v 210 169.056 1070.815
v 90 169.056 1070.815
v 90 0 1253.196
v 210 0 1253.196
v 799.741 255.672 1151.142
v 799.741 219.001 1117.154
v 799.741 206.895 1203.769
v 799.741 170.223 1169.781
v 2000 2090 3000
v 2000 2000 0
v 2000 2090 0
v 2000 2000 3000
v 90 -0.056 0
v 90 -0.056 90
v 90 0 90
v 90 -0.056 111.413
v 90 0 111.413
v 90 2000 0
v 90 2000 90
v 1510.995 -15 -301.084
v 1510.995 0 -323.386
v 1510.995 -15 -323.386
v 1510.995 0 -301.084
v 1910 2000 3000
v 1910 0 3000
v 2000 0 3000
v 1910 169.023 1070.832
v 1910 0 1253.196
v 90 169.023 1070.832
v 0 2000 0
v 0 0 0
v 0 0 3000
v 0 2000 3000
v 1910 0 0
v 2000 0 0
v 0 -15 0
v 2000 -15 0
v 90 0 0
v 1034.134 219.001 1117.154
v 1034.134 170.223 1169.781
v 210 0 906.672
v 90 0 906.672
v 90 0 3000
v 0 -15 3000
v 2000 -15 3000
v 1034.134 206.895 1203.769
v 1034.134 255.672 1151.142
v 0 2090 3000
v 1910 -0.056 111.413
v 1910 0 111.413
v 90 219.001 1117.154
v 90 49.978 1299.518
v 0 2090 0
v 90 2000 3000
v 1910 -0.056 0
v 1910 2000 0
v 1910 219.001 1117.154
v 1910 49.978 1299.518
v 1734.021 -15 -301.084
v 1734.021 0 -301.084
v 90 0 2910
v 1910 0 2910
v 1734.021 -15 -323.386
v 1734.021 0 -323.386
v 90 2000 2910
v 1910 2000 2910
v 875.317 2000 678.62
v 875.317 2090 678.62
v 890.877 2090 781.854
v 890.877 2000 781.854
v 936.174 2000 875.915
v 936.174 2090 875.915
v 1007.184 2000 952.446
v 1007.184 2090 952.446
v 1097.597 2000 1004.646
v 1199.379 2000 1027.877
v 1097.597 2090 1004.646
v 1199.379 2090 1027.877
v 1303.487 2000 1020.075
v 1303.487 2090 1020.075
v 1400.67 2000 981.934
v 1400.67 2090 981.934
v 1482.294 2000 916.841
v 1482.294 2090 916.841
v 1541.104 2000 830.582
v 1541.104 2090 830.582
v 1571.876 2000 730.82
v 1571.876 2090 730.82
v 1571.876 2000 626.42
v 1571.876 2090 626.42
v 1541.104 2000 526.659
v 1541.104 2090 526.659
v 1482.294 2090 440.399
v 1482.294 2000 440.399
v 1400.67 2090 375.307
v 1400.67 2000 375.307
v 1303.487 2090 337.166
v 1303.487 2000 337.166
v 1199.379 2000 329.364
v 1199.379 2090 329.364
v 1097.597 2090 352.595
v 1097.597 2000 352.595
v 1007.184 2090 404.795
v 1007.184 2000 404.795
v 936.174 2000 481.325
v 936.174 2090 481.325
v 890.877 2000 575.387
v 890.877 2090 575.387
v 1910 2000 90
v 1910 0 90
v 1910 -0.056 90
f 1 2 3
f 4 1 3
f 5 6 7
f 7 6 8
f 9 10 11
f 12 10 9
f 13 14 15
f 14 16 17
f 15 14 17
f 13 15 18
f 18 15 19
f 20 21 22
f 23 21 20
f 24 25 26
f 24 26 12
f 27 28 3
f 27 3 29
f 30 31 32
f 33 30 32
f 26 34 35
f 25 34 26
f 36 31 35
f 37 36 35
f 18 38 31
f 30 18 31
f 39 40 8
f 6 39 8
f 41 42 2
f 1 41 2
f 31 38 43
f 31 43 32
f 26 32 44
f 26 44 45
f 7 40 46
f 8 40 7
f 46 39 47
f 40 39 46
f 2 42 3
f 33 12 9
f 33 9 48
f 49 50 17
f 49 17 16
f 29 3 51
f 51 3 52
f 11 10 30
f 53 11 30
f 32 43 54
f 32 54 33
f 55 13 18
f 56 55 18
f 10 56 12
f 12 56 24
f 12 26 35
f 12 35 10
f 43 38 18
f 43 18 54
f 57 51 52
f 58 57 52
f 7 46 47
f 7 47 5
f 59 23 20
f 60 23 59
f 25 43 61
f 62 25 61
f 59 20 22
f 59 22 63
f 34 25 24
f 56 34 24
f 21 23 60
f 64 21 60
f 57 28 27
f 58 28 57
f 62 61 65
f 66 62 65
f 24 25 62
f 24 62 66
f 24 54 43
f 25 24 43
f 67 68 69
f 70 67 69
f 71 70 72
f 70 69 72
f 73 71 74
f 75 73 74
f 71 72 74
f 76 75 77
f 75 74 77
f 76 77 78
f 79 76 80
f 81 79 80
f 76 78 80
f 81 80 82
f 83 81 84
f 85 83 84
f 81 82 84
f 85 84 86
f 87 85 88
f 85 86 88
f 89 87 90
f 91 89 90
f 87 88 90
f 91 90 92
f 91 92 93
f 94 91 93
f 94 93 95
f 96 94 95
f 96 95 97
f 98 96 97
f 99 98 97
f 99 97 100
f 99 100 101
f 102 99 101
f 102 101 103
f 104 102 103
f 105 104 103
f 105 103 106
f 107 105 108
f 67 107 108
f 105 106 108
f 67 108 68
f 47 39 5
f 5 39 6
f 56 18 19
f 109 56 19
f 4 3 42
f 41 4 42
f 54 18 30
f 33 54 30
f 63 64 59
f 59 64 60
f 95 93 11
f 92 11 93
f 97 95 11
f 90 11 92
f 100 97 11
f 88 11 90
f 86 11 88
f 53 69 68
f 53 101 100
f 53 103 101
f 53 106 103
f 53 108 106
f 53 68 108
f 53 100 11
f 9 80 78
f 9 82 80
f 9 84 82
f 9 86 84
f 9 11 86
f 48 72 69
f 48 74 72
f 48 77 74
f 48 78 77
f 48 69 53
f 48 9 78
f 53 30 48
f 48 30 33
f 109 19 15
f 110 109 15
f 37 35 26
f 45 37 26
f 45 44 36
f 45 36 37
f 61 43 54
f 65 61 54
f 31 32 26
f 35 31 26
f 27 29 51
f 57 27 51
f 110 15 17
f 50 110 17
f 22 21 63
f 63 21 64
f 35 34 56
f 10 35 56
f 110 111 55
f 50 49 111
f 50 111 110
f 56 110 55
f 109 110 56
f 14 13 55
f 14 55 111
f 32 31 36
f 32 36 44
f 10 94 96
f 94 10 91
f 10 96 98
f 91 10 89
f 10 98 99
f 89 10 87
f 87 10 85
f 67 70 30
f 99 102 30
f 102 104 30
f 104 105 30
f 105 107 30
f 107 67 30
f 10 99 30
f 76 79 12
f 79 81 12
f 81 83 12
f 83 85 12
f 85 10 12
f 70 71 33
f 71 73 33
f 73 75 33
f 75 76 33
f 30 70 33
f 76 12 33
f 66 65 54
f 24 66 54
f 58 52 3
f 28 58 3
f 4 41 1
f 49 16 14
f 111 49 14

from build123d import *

# Parameters (mm, degrees)
F0_W      = 2000
F0_H      = 3000
F1_DEPTH  = 15
F0_W_2    = 223.0252540781
F0_H_2    = 22.3025142319
F2_W      = 90
F2_H      = 3000
F3_DEPTH  = 2000
F5_DEPTH  = 120
F7_DEPTH  = 1820
F8_W      = 234.393119812
F8_H      = 71.7555948407
F9_DEPTH  = 50
F11_DEPTH = 1820
F12_W     = 2000
F12_H     = 90
F12_W_2   = 0.0563644571
F13_DEPTH = 1820
F14_W     = 2000
F14_H     = 3000
F15_DEPTH = 90
F16_W     = 2000
F16_H     = 3000
F17_DEPTH = 90
F18_R     = 350.2358859711
F19_DEPTH = 90


# Not quite as in the source:
# - ends of sketch curves that miss each other by under 0.0002 mm in the source are joined


with BuildPart() as f1:
    # F0 (on Front) → F1 (new body)
    with BuildSketch(Plane.XZ):
        with Locations((1000, 1500)):
            Rectangle(F0_W, F0_H)
    extrude(amount=F1_DEPTH)


with BuildPart() as f1b:
    # F0 (on Front) → F1, piece 2 (new body)
    with BuildSketch(Plane.XZ):
        with Locations((1622.508082666, -312.2352271864)):
            Rectangle(F0_W_2, F0_H_2)
    extrude(amount=F1_DEPTH)


with BuildPart() as f3:
    # F2 (on face) → F3 (new body)
    with BuildSketch(Plane(origin=(0, 0, 0), x_dir=(-1, 0, 0), z_dir=(0, 1, 0))):
        with Locations((-45, 1500)):
            Rectangle(F2_W, F2_H)
    extrude(amount=F3_DEPTH)


with BuildPart() as f5:
    # F4 (on face) → F5 (new body)
    with BuildSketch(Plane.YZ.offset(90)):
        Polygon((169.0563857555, 1070.8147287369), (0, 1253.195643425), (0, 906.6718220711), align=None)
    extrude(amount=F5_DEPTH)


with BuildPart() as f7:
    # F6 (on face) → F7 (new body)
    with BuildSketch(Plane.YZ.offset(90)):
        Polygon((0, 1253.1963586807), (169.0228581429, 1070.8320140839), (219.0007353757, 1117.1535890194), (49.9778772329, 1299.5179336163), align=None)
    extrude(amount=F7_DEPTH)


with BuildPart() as f9:
    # F8 (on face) → F9 (new body)
    with BuildSketch(Plane(origin=(0, 674.7720834381, 625.4068271396), x_dir=(-1, 0, 0), z_dir=(0, 0.733425793, 0.6797695243))):
        with Locations((-916.9374704361, 706.3570286676)):
            Rectangle(F8_W, F8_H)
    extrude(amount=F9_DEPTH)


with BuildPart() as f11:
    # F10 (on face) → F11 (new body)
    with BuildSketch(Plane.YZ.offset(90)):
        Polygon((2000, 2910), (2000, 3000), (0, 3000), (0, 2910), (434.6059262753, 2910), (667.1281456947, 2910), align=None)
    extrude(amount=F11_DEPTH)


with BuildPart() as f13:
    # F12 (on face) → F13 (new body)
    with BuildSketch(Plane.YZ.offset(90)):
        with Locations((1000, 45)):
            Rectangle(F12_W, F12_H)
        with Locations((-0.0281822286, 45)):
            Rectangle(F12_W_2, F12_H)
        Polygon((-0.0563644571, 90), (0, 90), (0, 111.4134863019), (-0.0564195216, 111.4134863019), align=None)
    extrude(amount=F13_DEPTH)


with BuildPart() as f15:
    # F14 (on face) → F15 (new body)
    with BuildSketch(Plane.YZ.offset(1910)):
        with Locations((1000, 1500)):
            Rectangle(F14_W, F14_H)
    extrude(amount=F15_DEPTH)


with BuildPart() as f17:
    # F16 (on face) → F17 (new body)
    with BuildSketch(Plane(origin=(0, 2000, 0), x_dir=(-1, 0, 0), z_dir=(0, 1, 0))):
        with Locations((-1000, 1500)):
            Rectangle(F16_W, F16_H)
    extrude(amount=F17_DEPTH)

    # F18 (on face) → F19 (cut)
    with BuildSketch(Plane(origin=(0, 2090, 0), x_dir=(-1, 0, 0), z_dir=(0, 1, 0))):
        with Locations((-1225.5524396896, 678.6203980446)):
            Circle(F18_R)
    extrude(amount=-F19_DEPTH, mode=Mode.SUBTRACT)


solid = Compound([f1.part, f1b.part, f3.part, f5.part, f7.part, f9.part, f11.part, f13.part, f15.part, f17.part])
